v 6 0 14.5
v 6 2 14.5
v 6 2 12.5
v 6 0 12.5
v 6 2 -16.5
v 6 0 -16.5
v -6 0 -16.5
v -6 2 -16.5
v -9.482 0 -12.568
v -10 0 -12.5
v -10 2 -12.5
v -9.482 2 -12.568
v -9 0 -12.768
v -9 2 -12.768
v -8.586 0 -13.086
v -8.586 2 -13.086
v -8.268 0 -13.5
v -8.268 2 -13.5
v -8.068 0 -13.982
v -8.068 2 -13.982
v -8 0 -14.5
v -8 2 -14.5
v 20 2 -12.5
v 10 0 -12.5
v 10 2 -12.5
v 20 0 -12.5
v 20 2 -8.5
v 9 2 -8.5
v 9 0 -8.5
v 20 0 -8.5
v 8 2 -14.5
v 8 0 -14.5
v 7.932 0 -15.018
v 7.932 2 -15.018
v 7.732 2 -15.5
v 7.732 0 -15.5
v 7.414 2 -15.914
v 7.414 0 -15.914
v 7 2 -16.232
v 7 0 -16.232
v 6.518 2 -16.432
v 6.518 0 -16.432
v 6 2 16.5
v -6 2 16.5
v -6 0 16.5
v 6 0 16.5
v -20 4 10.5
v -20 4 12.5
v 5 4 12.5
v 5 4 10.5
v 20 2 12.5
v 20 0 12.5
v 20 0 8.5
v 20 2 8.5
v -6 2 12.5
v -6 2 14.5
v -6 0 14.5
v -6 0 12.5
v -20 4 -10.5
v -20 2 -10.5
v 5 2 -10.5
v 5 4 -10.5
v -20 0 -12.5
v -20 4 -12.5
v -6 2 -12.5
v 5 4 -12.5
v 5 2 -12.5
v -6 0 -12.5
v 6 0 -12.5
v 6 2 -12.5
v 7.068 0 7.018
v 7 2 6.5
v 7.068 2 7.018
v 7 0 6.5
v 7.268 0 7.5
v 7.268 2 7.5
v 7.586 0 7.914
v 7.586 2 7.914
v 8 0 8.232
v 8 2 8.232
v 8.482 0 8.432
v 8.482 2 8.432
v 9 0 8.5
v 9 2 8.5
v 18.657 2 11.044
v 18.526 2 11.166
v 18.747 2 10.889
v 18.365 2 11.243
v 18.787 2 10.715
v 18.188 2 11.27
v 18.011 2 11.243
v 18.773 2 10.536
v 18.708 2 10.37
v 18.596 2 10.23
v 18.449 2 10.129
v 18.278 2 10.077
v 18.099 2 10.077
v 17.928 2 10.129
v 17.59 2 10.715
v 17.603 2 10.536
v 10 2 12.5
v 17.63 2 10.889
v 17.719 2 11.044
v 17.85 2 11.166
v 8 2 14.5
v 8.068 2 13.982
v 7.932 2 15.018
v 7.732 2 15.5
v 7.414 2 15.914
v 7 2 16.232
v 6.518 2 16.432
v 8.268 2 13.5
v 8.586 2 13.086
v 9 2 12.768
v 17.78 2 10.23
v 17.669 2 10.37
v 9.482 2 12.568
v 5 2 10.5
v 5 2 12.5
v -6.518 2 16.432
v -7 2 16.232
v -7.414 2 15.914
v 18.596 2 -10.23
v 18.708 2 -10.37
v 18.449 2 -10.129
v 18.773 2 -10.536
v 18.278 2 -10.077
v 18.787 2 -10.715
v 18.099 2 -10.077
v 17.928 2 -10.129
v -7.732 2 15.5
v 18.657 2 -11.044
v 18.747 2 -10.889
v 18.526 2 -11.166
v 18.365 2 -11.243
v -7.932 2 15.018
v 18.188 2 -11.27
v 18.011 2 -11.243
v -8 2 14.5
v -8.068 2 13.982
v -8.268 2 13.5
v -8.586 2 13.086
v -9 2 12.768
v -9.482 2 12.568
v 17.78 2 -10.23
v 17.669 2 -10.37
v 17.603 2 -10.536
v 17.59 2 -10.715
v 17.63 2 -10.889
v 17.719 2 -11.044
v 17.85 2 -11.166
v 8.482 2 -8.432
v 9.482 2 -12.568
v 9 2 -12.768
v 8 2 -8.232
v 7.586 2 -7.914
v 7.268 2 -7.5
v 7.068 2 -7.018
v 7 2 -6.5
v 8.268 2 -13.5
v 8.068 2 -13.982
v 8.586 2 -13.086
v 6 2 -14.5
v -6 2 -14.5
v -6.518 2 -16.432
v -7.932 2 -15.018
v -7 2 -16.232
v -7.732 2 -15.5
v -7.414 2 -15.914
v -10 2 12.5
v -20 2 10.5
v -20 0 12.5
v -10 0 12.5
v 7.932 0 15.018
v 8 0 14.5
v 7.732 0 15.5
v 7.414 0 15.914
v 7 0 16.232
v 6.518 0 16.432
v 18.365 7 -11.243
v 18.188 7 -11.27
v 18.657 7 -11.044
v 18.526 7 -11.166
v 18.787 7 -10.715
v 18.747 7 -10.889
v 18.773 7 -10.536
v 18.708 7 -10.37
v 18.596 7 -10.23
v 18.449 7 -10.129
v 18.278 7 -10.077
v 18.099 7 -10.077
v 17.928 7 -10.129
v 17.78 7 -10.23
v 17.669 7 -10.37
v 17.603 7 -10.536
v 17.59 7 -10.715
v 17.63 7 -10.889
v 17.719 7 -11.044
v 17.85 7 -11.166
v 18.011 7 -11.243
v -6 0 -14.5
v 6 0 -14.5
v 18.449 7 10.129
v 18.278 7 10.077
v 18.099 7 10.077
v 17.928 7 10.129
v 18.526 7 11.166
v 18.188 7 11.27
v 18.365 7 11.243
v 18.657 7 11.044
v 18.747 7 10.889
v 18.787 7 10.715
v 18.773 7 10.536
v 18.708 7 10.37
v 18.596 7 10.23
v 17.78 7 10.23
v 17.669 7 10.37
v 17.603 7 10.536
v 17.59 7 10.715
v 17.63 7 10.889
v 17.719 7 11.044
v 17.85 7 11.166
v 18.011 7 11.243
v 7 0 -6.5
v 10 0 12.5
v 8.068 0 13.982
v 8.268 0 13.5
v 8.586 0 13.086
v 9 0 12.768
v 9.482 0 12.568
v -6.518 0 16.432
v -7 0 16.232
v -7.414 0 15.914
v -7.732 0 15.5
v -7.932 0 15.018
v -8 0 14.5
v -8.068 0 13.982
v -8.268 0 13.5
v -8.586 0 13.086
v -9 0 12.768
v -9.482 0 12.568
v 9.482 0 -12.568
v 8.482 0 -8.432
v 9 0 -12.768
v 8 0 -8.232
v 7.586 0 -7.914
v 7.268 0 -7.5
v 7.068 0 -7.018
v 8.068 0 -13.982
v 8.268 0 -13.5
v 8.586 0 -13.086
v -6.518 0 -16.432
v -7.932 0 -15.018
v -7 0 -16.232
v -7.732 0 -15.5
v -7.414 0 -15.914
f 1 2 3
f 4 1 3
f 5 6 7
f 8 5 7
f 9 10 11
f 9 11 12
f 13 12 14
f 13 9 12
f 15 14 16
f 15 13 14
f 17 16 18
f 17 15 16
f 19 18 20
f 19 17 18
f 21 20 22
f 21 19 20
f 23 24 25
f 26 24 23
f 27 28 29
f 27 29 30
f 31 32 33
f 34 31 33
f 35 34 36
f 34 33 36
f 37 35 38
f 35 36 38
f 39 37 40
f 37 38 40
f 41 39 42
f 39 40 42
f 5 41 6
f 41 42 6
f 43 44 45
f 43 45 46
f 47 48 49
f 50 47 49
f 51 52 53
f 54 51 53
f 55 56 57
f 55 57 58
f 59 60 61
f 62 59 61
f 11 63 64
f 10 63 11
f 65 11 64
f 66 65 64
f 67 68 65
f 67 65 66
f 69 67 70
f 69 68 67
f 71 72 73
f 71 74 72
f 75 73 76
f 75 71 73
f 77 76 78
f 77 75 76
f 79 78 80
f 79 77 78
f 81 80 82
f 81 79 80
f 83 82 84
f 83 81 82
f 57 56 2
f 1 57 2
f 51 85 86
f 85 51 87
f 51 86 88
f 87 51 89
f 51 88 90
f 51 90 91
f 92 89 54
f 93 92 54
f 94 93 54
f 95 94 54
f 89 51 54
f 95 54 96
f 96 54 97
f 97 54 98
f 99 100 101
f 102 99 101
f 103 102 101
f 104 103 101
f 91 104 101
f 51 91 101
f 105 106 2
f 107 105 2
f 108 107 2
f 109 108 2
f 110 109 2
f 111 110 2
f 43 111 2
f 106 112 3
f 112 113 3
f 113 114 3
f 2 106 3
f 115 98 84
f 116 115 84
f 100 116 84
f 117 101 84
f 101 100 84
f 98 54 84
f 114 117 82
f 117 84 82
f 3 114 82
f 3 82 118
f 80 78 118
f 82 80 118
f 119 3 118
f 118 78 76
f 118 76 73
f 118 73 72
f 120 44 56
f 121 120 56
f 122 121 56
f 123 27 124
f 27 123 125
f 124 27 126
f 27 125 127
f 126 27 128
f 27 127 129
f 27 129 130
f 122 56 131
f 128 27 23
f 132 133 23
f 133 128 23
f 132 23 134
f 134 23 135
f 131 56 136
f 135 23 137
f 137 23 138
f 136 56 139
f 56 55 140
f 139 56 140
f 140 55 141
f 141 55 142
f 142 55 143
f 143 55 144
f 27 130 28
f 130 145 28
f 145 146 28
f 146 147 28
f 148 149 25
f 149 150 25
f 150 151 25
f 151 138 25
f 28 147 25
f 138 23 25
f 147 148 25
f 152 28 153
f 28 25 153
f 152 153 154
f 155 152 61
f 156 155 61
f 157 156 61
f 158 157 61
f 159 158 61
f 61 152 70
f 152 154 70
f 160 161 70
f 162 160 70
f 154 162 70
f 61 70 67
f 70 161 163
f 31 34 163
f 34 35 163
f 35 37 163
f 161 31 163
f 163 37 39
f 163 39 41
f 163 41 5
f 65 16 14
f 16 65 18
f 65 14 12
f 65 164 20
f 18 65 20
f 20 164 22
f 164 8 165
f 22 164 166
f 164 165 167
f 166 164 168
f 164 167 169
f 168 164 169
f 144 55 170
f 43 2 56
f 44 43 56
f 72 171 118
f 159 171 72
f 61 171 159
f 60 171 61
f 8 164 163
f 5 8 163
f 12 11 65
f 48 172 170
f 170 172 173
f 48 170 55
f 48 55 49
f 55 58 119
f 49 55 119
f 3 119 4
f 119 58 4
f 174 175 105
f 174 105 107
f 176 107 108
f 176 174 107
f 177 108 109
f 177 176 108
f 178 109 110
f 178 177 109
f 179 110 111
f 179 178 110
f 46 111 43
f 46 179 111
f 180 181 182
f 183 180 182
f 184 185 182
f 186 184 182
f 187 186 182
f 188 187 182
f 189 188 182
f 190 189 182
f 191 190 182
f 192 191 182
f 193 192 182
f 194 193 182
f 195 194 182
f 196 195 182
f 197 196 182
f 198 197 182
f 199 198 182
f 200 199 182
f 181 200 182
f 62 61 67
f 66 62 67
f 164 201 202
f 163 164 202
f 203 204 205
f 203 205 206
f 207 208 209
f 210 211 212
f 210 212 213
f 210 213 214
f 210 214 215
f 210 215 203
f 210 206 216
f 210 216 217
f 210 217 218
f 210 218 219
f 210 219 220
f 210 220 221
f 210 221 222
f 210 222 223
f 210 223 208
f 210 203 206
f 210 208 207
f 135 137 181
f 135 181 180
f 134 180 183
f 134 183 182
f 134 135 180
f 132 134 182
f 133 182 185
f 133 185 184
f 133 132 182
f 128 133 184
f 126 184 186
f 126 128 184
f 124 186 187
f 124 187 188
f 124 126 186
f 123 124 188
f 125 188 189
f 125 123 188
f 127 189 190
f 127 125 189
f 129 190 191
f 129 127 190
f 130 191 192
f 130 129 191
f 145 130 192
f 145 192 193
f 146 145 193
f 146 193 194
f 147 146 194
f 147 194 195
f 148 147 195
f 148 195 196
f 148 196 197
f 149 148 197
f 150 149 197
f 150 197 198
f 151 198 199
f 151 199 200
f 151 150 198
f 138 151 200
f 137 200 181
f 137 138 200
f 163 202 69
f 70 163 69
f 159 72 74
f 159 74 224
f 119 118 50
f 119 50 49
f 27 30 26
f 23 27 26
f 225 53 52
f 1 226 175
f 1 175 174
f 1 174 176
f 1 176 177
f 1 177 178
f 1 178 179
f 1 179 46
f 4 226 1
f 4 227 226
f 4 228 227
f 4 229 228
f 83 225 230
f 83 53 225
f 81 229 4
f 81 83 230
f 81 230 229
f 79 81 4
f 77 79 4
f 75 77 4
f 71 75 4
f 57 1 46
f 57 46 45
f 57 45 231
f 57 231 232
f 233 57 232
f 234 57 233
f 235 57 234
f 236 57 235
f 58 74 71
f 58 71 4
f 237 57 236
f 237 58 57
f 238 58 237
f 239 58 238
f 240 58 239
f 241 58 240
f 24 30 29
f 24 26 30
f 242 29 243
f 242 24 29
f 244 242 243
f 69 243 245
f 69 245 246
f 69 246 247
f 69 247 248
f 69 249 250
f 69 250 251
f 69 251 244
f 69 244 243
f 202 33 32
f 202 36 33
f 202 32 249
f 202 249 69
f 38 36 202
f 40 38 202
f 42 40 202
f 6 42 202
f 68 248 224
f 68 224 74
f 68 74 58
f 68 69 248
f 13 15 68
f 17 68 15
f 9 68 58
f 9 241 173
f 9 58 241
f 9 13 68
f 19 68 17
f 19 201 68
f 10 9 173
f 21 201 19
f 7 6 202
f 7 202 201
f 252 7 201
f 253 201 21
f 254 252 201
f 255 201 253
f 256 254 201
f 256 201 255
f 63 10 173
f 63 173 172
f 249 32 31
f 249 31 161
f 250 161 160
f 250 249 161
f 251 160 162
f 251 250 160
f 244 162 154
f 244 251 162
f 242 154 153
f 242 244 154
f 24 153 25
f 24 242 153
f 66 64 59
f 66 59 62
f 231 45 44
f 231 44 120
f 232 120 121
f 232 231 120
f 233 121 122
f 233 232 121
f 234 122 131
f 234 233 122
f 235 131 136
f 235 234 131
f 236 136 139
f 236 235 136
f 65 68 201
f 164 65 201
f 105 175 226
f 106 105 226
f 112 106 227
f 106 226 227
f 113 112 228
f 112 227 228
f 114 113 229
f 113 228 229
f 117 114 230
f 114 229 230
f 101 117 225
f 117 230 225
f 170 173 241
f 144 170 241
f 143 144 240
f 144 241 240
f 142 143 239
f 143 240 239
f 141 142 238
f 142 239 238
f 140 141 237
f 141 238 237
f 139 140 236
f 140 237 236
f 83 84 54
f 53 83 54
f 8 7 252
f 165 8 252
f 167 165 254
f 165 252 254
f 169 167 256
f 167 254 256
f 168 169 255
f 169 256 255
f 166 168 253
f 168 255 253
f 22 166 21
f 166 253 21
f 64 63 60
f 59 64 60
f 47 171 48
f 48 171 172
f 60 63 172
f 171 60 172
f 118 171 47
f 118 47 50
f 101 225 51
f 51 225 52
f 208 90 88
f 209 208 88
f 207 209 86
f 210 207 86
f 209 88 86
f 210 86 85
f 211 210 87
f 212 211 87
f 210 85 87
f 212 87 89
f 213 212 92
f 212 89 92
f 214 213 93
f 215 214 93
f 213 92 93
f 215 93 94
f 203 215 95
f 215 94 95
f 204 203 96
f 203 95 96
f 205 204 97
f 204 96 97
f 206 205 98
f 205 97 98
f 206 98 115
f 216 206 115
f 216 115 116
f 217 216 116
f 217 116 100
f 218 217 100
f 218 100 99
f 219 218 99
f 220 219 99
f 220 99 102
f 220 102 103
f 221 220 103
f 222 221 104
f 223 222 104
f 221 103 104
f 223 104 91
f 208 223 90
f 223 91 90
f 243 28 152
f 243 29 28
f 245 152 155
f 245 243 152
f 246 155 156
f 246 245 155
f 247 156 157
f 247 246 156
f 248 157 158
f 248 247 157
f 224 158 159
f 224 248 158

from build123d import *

# Parameters (mm, degrees)
SKETCH1_W           = 40
SKETCH1_H           = 25
BOSS_EXTRUDE1_DEPTH = 2
SKETCH2_W           = 25
SKETCH2_H           = 2
BOSS_EXTRUDE2_DEPTH = 2
SKETCH3_W           = 13
SKETCH3_H           = 17
CUT_EXTRUDE1_DEPTH  = 3
SKETCH4_R           = 0.6
BOSS_EXTRUDE3_DEPTH = 5
SKETCH5_W           = 16
SKETCH5_H           = 2
BOSS_EXTRUDE4_DEPTH = 4
SKETCH6_W           = 12
SKETCH6_H           = 2
CUT_EXTRUDE2_DEPTH  = 4
FILLET1_START       = -1
FILLET1_DEPTH       = 4
FILLET1_2_DEPTH     = 2
MIRROR4_DEPTH       = 2
FILLET2_R           = 2
FILLET3_R           = 2


with BuildPart() as part:
    # Sketch1 → Boss-Extrude1 (new body)
    with BuildSketch(Plane(origin=(0, 0, 0), x_dir=(1, 0, 0), z_dir=(0, 1, 0))):
        Rectangle(SKETCH1_W, SKETCH1_H)
    extrude(amount=BOSS_EXTRUDE1_DEPTH)

    # Sketch2 → Boss-Extrude2 (add)
    with BuildSketch(Plane(origin=(0, 2, 0), x_dir=(1, 0, 0), z_dir=(0, 1, 0))):
        with Locations((-7.5, 11.5)):
            Rectangle(SKETCH2_W, SKETCH2_H)
    boss_extrude2 = extrude(amount=BOSS_EXTRUDE2_DEPTH)

    # Mirror1: Boss-Extrude2 across plane
    add(boss_extrude2.mirror(Plane.XY))

    # Sketch3 → Cut-Extrude1 (cut)
    with BuildSketch(Plane(origin=(0, 2, 0), x_dir=(1, 0, 0), z_dir=(0, 1, 0))):
        with Locations((13.5, 0)):
            Rectangle(SKETCH3_W, SKETCH3_H)
    extrude(amount=-CUT_EXTRUDE1_DEPTH, mode=Mode.SUBTRACT)

    # Sketch4 → Boss-Extrude3 (add)
    with BuildSketch(Plane(origin=(0, 2, 0), x_dir=(1, 0, 0), z_dir=(0, 1, 0))):
        with Locations(Location((18.188184095, -10.67, 0), (0, 0, 270))):
            Circle(SKETCH4_R)
    boss_extrude3 = extrude(amount=BOSS_EXTRUDE3_DEPTH)

    # Mirror2: Boss-Extrude3 across plane
    add(boss_extrude3.mirror(Plane.XY))

    # Sketch5 → Boss-Extrude4 (add)
    with BuildSketch(Plane.XY.offset(12.5)):
        with Locations((0, 1)):
            Rectangle(SKETCH5_W, SKETCH5_H)
    extrude(amount=BOSS_EXTRUDE4_DEPTH)

    # Sketch6 → Cut-Extrude2 (cut)
    with BuildSketch(Plane(origin=(0, 2, 0), x_dir=(1, 0, 0), z_dir=(0, 1, 0))):
        with Locations((0, -13.5)):
            Rectangle(SKETCH6_W, SKETCH6_H)
    extrude(amount=-CUT_EXTRUDE2_DEPTH, mode=Mode.SUBTRACT)

    # Fillet1: read off the stored shape, not the designer's step
    # Fillet1 outline → Fillet1 (cut)
    with BuildSketch(Plane(origin=(0, 0, 0), x_dir=(1, 0, 0), z_dir=(0, 1, 0)).offset(FILLET1_START)):
        with BuildLine():
            ThreePointArc((8, -14.5), (7.414213562, -15.914213562), (6, -16.5))
            Line((6, -16.5), (8, -16.5))
            Line((8, -16.5), (8, -14.5))
        make_face()
        with BuildLine():
            Line((-8, -16.5), (-6, -16.5))
            ThreePointArc((-6, -16.5), (-7.414213562, -15.914213562), (-8, -14.5))
            Line((-8, -14.5), (-8, -16.5))
        make_face()
    extrude(amount=FILLET1_DEPTH, mode=Mode.SUBTRACT)

    # Fillet1 2 outline → Fillet1 2 (add)
    with BuildSketch(Plane(origin=(0, 0, 0), x_dir=(1, 0, 0), z_dir=(0, 1, 0))):
        with BuildLine():
            Line((8, -12.5), (8, -14.5))
            ThreePointArc((8, -14.5), (8.585786438, -13.085786438), (10, -12.5))
            Line((10, -12.5), (8, -12.5))
        make_face()
        with BuildLine():
            ThreePointArc((-10, -12.5), (-8.585786438, -13.085786438), (-8, -14.5))
            Line((-8, -14.5), (-8, -12.5))
            Line((-8, -12.5), (-10, -12.5))
        make_face()
    extrude(amount=FILLET1_2_DEPTH)

    # Mirror4: read off the stored shape, not the designer's step
    # Mirror4 outline → Mirror4 (add)
    with BuildSketch(Plane(origin=(0, 0, 0), x_dir=(1, 0, 0), z_dir=(0, 1, 0))):
        with BuildLine():
            Line((-8, 12.5), (-6, 12.5))
            Line((-6, 12.5), (-6, 14.5))
            Line((-6, 14.5), (6, 14.5))
            Line((6, 14.5), (6, 12.5))
            Line((6, 12.5), (8, 12.5))
            Line((8, 12.5), (8, 14.5))
            ThreePointArc((8, 14.5), (7.414213562, 15.914213562), (6, 16.5))
            Line((6, 16.5), (-6, 16.5))
            ThreePointArc((-6, 16.5), (-7.414213562, 15.914213562), (-8, 14.5))
            Line((-8, 14.5), (-8, 12.5))
        make_face()
    extrude(amount=MIRROR4_DEPTH)

    # Fillet2
    # the kernel refuses this fillet: 2 mm, written as the material it adds along each edge
    with BuildSketch(Plane(origin=(-8, 0, -12.5), x_dir=(-1, 0, 0), z_dir=(0, 1, 0))) as fillet2_piece_1:
        with BuildLine():
            CenterArc((FILLET2_R, -FILLET2_R), FILLET2_R, 90, 90)
            Line((0, -FILLET2_R), (0, 0))
            Line((0, 0), (FILLET2_R, 0))
        make_face()
    extrude(amount=2)
    with BuildSketch(Plane(origin=(8, 0, -12.5), x_dir=(1, 0, 0), z_dir=(0, 1, 0))) as fillet2_piece_2:
        with BuildLine():
            CenterArc((FILLET2_R, FILLET2_R), FILLET2_R, 180, 90)
            Line((0, FILLET2_R), (0, 0))
            Line((0, 0), (FILLET2_R, 0))
        make_face()
    extrude(amount=2)

    # Fillet3
    fillet3_edges = [part.edges().sort_by_distance(p)[0] for p in [
        (7, 1, 8.5),
        (7, 1, -8.5),
    ]]
    fillet(fillet3_edges, radius=FILLET3_R)


solid = part.part
